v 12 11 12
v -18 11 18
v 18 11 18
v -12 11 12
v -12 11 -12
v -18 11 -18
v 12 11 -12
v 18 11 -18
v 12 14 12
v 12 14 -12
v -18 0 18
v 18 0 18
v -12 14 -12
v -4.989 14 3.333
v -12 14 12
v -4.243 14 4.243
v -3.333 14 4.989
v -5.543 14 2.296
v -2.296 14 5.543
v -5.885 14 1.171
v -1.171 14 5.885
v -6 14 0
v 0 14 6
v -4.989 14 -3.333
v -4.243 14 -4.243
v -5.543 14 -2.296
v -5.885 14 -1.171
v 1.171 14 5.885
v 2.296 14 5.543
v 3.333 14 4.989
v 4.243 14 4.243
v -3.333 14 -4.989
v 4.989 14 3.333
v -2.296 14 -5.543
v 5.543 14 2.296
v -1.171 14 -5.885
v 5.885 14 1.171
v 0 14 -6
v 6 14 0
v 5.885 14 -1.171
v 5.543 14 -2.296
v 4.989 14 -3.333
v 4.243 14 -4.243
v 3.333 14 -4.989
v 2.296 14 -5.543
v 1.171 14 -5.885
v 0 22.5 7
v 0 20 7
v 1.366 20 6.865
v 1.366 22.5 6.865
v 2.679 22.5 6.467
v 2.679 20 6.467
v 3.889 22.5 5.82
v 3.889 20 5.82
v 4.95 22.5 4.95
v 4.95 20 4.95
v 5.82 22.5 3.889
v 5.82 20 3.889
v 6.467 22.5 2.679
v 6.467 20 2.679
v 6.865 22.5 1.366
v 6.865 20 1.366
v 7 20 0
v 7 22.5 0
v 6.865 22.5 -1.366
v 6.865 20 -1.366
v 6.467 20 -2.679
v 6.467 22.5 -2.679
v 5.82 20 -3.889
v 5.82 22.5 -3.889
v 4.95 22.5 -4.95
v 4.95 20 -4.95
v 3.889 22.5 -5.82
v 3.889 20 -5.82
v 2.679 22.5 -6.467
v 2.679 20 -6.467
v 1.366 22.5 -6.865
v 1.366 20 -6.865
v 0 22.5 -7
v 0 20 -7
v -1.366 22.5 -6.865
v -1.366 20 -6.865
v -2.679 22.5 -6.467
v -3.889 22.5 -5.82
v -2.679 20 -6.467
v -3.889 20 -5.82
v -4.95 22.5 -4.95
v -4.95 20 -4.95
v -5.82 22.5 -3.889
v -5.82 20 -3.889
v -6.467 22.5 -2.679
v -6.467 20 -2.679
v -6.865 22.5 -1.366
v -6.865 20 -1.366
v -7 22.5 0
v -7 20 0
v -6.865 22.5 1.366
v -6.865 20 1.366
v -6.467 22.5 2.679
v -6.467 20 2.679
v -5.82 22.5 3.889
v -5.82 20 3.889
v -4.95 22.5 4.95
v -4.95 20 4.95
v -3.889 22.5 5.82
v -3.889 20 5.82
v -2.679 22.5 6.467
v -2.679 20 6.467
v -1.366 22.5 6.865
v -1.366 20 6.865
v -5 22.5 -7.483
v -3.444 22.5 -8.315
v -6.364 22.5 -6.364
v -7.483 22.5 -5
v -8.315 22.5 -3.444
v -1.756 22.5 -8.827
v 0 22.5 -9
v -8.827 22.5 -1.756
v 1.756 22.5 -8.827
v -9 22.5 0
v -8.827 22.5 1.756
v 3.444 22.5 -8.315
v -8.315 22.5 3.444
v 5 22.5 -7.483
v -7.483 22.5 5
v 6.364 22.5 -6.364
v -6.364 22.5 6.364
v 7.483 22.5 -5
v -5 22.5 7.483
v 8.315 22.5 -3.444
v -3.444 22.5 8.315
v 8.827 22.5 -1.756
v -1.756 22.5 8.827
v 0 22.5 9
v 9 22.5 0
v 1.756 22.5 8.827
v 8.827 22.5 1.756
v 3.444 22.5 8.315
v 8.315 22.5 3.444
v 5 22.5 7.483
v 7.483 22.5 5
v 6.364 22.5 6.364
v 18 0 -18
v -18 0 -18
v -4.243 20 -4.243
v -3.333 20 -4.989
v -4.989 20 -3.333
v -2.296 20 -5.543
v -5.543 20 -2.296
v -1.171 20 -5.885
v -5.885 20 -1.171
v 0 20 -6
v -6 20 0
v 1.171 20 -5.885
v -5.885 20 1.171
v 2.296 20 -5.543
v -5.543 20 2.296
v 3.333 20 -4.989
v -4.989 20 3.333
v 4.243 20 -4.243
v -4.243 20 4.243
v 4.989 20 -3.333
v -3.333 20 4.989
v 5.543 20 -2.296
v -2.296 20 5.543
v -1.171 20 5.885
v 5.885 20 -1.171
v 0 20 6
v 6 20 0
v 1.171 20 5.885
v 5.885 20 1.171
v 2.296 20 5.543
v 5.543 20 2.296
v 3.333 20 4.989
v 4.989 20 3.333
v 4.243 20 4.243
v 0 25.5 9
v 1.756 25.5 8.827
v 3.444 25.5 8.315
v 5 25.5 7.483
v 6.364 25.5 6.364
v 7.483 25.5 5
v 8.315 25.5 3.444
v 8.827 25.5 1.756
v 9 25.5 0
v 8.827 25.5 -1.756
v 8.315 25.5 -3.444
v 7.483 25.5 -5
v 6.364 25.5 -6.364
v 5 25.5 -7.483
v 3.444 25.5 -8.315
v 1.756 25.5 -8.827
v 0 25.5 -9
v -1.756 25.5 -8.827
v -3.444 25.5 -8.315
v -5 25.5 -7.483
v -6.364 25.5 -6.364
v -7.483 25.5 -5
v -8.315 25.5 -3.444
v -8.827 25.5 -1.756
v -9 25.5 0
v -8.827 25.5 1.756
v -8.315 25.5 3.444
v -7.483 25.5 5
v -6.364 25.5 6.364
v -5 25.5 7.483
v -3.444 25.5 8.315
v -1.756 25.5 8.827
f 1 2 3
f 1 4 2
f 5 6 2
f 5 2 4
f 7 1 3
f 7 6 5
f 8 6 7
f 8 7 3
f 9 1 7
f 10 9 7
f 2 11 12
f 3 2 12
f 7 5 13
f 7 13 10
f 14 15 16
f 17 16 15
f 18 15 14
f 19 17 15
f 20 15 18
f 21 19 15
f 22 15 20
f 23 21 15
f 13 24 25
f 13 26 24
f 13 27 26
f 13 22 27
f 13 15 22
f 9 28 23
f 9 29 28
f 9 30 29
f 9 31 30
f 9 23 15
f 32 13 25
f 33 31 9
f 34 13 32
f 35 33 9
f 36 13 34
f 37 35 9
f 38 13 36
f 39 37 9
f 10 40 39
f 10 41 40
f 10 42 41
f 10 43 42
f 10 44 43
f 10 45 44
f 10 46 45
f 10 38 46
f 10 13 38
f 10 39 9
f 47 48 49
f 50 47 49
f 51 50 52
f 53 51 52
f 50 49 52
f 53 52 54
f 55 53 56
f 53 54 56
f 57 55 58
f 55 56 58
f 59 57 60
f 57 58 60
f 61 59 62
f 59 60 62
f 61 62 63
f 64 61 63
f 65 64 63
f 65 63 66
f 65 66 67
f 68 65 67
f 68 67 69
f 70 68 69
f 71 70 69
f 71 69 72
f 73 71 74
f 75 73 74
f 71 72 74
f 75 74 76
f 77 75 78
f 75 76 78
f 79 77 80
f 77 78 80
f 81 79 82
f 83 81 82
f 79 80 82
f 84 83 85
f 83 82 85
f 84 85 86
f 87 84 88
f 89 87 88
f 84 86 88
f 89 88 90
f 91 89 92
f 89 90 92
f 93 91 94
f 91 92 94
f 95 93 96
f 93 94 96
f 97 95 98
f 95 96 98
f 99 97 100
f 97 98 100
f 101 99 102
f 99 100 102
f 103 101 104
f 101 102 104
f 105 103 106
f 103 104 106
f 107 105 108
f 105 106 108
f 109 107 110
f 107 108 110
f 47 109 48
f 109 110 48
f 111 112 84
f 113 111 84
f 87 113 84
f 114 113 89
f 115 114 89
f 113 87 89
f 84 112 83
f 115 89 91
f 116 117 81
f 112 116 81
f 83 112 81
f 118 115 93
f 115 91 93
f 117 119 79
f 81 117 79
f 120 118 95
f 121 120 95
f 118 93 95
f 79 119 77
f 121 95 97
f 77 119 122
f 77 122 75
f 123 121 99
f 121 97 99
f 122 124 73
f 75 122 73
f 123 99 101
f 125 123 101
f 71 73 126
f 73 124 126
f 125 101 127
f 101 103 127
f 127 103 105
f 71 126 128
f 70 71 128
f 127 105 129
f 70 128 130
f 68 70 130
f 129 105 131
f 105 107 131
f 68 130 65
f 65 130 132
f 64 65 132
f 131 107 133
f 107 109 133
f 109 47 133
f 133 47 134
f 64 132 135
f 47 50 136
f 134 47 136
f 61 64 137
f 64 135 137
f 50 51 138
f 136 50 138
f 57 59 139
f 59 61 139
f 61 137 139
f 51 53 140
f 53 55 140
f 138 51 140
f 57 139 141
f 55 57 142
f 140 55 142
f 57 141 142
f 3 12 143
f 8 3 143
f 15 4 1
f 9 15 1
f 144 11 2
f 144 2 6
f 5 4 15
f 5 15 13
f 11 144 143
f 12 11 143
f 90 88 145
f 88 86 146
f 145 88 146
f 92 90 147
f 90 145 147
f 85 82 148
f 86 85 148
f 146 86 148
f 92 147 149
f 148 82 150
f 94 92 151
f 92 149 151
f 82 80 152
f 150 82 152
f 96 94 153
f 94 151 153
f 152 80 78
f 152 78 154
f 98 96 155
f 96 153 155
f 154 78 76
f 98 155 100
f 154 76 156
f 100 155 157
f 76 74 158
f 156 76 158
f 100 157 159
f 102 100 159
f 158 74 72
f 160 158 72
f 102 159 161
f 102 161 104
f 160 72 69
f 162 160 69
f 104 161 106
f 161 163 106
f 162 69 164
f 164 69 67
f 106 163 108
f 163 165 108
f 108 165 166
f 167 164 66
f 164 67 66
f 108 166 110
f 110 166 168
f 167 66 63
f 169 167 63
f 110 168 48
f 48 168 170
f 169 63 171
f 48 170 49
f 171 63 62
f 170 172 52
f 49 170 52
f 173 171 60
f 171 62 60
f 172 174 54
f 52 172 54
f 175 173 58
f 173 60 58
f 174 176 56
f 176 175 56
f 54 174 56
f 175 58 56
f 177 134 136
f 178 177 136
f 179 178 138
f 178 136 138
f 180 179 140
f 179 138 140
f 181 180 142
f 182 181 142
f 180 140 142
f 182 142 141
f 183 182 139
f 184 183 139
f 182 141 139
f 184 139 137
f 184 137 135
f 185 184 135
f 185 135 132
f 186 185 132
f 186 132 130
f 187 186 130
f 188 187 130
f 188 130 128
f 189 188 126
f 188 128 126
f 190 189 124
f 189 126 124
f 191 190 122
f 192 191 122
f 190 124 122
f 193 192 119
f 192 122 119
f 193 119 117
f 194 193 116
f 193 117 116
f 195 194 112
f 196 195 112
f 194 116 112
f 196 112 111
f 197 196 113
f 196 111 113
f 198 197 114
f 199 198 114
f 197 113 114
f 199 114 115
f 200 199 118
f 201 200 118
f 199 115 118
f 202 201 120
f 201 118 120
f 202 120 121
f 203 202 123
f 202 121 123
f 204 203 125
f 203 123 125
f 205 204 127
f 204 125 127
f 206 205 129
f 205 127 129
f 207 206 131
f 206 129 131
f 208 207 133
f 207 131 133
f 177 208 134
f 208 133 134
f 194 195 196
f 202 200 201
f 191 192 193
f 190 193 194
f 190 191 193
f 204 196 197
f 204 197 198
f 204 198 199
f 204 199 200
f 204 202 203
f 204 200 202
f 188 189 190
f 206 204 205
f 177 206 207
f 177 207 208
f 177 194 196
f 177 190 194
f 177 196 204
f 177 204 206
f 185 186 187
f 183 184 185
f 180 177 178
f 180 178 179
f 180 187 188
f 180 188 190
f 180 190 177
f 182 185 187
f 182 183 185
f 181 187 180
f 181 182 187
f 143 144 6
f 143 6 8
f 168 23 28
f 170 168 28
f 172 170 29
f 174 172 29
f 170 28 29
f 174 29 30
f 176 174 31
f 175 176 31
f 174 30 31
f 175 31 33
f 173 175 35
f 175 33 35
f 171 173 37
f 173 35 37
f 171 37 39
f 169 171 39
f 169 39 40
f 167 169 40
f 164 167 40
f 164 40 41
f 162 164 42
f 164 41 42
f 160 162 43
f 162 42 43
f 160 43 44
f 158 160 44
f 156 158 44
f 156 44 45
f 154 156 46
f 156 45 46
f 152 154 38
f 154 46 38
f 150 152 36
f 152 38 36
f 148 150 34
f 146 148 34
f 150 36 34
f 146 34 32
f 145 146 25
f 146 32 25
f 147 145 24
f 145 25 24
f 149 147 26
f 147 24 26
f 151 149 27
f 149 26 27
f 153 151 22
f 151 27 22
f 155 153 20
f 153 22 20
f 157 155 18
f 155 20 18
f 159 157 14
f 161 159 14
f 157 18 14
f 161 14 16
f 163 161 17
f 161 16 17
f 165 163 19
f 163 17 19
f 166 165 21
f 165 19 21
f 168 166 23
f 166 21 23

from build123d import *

# Parameters (mm, degrees)
SKETCH1_W           = 36
SKETCH1_H           = 36
BOSS_EXTRUDE1_DEPTH = 11
SKETCH2_W           = 24
SKETCH2_H           = 24
BOSS_EXTRUDE2_DEPTH = 3
SKETCH3_R           = 6
BOSS_EXTRUDE3_DEPTH = 6
SKETCH4_R           = 7
BOSS_EXTRUDE4_DEPTH = 2.5
SKETCH5_R           = 9
BOSS_EXTRUDE5_DEPTH = 3


with BuildPart() as part:
    # Sketch1 → Boss-Extrude1 (new body)
    with BuildSketch(Plane(origin=(0, 0, 0), x_dir=(1, 0, 0), z_dir=(0, 1, 0))):
        Rectangle(SKETCH1_W, SKETCH1_H)
    extrude(amount=BOSS_EXTRUDE1_DEPTH)

    # Sketch2 → Boss-Extrude2 (add)
    with BuildSketch(Plane(origin=(0, 11, 0), x_dir=(1, 0, 0), z_dir=(0, 1, 0))):
        Rectangle(SKETCH2_W, SKETCH2_H)
    extrude(amount=BOSS_EXTRUDE2_DEPTH)

    # Sketch3 → Boss-Extrude3 (add)
    with BuildSketch(Plane(origin=(0, 14, 0), x_dir=(1, 0, 0), z_dir=(0, 1, 0))):
        with Locations(Location((0, 0, 0), (0, 0, 270))):
            Circle(SKETCH3_R)
    extrude(amount=BOSS_EXTRUDE3_DEPTH)

    # Sketch4 → Boss-Extrude4 (add)
    with BuildSketch(Plane(origin=(0, 20, 0), x_dir=(1, 0, 0), z_dir=(0, 1, 0))):
        with Locations(Location((0, 0, 0), (0, 0, 270))):
            Circle(SKETCH4_R)
    extrude(amount=BOSS_EXTRUDE4_DEPTH)

    # Sketch5 → Boss-Extrude5 (add)
    with BuildSketch(Plane(origin=(0, 22.5, 0), x_dir=(1, 0, 0), z_dir=(0, 1, 0))):
        with Locations(Location((0, 0, 0), (0, 0, 270))):
            Circle(SKETCH5_R)
    extrude(amount=BOSS_EXTRUDE5_DEPTH)


solid = part.part
